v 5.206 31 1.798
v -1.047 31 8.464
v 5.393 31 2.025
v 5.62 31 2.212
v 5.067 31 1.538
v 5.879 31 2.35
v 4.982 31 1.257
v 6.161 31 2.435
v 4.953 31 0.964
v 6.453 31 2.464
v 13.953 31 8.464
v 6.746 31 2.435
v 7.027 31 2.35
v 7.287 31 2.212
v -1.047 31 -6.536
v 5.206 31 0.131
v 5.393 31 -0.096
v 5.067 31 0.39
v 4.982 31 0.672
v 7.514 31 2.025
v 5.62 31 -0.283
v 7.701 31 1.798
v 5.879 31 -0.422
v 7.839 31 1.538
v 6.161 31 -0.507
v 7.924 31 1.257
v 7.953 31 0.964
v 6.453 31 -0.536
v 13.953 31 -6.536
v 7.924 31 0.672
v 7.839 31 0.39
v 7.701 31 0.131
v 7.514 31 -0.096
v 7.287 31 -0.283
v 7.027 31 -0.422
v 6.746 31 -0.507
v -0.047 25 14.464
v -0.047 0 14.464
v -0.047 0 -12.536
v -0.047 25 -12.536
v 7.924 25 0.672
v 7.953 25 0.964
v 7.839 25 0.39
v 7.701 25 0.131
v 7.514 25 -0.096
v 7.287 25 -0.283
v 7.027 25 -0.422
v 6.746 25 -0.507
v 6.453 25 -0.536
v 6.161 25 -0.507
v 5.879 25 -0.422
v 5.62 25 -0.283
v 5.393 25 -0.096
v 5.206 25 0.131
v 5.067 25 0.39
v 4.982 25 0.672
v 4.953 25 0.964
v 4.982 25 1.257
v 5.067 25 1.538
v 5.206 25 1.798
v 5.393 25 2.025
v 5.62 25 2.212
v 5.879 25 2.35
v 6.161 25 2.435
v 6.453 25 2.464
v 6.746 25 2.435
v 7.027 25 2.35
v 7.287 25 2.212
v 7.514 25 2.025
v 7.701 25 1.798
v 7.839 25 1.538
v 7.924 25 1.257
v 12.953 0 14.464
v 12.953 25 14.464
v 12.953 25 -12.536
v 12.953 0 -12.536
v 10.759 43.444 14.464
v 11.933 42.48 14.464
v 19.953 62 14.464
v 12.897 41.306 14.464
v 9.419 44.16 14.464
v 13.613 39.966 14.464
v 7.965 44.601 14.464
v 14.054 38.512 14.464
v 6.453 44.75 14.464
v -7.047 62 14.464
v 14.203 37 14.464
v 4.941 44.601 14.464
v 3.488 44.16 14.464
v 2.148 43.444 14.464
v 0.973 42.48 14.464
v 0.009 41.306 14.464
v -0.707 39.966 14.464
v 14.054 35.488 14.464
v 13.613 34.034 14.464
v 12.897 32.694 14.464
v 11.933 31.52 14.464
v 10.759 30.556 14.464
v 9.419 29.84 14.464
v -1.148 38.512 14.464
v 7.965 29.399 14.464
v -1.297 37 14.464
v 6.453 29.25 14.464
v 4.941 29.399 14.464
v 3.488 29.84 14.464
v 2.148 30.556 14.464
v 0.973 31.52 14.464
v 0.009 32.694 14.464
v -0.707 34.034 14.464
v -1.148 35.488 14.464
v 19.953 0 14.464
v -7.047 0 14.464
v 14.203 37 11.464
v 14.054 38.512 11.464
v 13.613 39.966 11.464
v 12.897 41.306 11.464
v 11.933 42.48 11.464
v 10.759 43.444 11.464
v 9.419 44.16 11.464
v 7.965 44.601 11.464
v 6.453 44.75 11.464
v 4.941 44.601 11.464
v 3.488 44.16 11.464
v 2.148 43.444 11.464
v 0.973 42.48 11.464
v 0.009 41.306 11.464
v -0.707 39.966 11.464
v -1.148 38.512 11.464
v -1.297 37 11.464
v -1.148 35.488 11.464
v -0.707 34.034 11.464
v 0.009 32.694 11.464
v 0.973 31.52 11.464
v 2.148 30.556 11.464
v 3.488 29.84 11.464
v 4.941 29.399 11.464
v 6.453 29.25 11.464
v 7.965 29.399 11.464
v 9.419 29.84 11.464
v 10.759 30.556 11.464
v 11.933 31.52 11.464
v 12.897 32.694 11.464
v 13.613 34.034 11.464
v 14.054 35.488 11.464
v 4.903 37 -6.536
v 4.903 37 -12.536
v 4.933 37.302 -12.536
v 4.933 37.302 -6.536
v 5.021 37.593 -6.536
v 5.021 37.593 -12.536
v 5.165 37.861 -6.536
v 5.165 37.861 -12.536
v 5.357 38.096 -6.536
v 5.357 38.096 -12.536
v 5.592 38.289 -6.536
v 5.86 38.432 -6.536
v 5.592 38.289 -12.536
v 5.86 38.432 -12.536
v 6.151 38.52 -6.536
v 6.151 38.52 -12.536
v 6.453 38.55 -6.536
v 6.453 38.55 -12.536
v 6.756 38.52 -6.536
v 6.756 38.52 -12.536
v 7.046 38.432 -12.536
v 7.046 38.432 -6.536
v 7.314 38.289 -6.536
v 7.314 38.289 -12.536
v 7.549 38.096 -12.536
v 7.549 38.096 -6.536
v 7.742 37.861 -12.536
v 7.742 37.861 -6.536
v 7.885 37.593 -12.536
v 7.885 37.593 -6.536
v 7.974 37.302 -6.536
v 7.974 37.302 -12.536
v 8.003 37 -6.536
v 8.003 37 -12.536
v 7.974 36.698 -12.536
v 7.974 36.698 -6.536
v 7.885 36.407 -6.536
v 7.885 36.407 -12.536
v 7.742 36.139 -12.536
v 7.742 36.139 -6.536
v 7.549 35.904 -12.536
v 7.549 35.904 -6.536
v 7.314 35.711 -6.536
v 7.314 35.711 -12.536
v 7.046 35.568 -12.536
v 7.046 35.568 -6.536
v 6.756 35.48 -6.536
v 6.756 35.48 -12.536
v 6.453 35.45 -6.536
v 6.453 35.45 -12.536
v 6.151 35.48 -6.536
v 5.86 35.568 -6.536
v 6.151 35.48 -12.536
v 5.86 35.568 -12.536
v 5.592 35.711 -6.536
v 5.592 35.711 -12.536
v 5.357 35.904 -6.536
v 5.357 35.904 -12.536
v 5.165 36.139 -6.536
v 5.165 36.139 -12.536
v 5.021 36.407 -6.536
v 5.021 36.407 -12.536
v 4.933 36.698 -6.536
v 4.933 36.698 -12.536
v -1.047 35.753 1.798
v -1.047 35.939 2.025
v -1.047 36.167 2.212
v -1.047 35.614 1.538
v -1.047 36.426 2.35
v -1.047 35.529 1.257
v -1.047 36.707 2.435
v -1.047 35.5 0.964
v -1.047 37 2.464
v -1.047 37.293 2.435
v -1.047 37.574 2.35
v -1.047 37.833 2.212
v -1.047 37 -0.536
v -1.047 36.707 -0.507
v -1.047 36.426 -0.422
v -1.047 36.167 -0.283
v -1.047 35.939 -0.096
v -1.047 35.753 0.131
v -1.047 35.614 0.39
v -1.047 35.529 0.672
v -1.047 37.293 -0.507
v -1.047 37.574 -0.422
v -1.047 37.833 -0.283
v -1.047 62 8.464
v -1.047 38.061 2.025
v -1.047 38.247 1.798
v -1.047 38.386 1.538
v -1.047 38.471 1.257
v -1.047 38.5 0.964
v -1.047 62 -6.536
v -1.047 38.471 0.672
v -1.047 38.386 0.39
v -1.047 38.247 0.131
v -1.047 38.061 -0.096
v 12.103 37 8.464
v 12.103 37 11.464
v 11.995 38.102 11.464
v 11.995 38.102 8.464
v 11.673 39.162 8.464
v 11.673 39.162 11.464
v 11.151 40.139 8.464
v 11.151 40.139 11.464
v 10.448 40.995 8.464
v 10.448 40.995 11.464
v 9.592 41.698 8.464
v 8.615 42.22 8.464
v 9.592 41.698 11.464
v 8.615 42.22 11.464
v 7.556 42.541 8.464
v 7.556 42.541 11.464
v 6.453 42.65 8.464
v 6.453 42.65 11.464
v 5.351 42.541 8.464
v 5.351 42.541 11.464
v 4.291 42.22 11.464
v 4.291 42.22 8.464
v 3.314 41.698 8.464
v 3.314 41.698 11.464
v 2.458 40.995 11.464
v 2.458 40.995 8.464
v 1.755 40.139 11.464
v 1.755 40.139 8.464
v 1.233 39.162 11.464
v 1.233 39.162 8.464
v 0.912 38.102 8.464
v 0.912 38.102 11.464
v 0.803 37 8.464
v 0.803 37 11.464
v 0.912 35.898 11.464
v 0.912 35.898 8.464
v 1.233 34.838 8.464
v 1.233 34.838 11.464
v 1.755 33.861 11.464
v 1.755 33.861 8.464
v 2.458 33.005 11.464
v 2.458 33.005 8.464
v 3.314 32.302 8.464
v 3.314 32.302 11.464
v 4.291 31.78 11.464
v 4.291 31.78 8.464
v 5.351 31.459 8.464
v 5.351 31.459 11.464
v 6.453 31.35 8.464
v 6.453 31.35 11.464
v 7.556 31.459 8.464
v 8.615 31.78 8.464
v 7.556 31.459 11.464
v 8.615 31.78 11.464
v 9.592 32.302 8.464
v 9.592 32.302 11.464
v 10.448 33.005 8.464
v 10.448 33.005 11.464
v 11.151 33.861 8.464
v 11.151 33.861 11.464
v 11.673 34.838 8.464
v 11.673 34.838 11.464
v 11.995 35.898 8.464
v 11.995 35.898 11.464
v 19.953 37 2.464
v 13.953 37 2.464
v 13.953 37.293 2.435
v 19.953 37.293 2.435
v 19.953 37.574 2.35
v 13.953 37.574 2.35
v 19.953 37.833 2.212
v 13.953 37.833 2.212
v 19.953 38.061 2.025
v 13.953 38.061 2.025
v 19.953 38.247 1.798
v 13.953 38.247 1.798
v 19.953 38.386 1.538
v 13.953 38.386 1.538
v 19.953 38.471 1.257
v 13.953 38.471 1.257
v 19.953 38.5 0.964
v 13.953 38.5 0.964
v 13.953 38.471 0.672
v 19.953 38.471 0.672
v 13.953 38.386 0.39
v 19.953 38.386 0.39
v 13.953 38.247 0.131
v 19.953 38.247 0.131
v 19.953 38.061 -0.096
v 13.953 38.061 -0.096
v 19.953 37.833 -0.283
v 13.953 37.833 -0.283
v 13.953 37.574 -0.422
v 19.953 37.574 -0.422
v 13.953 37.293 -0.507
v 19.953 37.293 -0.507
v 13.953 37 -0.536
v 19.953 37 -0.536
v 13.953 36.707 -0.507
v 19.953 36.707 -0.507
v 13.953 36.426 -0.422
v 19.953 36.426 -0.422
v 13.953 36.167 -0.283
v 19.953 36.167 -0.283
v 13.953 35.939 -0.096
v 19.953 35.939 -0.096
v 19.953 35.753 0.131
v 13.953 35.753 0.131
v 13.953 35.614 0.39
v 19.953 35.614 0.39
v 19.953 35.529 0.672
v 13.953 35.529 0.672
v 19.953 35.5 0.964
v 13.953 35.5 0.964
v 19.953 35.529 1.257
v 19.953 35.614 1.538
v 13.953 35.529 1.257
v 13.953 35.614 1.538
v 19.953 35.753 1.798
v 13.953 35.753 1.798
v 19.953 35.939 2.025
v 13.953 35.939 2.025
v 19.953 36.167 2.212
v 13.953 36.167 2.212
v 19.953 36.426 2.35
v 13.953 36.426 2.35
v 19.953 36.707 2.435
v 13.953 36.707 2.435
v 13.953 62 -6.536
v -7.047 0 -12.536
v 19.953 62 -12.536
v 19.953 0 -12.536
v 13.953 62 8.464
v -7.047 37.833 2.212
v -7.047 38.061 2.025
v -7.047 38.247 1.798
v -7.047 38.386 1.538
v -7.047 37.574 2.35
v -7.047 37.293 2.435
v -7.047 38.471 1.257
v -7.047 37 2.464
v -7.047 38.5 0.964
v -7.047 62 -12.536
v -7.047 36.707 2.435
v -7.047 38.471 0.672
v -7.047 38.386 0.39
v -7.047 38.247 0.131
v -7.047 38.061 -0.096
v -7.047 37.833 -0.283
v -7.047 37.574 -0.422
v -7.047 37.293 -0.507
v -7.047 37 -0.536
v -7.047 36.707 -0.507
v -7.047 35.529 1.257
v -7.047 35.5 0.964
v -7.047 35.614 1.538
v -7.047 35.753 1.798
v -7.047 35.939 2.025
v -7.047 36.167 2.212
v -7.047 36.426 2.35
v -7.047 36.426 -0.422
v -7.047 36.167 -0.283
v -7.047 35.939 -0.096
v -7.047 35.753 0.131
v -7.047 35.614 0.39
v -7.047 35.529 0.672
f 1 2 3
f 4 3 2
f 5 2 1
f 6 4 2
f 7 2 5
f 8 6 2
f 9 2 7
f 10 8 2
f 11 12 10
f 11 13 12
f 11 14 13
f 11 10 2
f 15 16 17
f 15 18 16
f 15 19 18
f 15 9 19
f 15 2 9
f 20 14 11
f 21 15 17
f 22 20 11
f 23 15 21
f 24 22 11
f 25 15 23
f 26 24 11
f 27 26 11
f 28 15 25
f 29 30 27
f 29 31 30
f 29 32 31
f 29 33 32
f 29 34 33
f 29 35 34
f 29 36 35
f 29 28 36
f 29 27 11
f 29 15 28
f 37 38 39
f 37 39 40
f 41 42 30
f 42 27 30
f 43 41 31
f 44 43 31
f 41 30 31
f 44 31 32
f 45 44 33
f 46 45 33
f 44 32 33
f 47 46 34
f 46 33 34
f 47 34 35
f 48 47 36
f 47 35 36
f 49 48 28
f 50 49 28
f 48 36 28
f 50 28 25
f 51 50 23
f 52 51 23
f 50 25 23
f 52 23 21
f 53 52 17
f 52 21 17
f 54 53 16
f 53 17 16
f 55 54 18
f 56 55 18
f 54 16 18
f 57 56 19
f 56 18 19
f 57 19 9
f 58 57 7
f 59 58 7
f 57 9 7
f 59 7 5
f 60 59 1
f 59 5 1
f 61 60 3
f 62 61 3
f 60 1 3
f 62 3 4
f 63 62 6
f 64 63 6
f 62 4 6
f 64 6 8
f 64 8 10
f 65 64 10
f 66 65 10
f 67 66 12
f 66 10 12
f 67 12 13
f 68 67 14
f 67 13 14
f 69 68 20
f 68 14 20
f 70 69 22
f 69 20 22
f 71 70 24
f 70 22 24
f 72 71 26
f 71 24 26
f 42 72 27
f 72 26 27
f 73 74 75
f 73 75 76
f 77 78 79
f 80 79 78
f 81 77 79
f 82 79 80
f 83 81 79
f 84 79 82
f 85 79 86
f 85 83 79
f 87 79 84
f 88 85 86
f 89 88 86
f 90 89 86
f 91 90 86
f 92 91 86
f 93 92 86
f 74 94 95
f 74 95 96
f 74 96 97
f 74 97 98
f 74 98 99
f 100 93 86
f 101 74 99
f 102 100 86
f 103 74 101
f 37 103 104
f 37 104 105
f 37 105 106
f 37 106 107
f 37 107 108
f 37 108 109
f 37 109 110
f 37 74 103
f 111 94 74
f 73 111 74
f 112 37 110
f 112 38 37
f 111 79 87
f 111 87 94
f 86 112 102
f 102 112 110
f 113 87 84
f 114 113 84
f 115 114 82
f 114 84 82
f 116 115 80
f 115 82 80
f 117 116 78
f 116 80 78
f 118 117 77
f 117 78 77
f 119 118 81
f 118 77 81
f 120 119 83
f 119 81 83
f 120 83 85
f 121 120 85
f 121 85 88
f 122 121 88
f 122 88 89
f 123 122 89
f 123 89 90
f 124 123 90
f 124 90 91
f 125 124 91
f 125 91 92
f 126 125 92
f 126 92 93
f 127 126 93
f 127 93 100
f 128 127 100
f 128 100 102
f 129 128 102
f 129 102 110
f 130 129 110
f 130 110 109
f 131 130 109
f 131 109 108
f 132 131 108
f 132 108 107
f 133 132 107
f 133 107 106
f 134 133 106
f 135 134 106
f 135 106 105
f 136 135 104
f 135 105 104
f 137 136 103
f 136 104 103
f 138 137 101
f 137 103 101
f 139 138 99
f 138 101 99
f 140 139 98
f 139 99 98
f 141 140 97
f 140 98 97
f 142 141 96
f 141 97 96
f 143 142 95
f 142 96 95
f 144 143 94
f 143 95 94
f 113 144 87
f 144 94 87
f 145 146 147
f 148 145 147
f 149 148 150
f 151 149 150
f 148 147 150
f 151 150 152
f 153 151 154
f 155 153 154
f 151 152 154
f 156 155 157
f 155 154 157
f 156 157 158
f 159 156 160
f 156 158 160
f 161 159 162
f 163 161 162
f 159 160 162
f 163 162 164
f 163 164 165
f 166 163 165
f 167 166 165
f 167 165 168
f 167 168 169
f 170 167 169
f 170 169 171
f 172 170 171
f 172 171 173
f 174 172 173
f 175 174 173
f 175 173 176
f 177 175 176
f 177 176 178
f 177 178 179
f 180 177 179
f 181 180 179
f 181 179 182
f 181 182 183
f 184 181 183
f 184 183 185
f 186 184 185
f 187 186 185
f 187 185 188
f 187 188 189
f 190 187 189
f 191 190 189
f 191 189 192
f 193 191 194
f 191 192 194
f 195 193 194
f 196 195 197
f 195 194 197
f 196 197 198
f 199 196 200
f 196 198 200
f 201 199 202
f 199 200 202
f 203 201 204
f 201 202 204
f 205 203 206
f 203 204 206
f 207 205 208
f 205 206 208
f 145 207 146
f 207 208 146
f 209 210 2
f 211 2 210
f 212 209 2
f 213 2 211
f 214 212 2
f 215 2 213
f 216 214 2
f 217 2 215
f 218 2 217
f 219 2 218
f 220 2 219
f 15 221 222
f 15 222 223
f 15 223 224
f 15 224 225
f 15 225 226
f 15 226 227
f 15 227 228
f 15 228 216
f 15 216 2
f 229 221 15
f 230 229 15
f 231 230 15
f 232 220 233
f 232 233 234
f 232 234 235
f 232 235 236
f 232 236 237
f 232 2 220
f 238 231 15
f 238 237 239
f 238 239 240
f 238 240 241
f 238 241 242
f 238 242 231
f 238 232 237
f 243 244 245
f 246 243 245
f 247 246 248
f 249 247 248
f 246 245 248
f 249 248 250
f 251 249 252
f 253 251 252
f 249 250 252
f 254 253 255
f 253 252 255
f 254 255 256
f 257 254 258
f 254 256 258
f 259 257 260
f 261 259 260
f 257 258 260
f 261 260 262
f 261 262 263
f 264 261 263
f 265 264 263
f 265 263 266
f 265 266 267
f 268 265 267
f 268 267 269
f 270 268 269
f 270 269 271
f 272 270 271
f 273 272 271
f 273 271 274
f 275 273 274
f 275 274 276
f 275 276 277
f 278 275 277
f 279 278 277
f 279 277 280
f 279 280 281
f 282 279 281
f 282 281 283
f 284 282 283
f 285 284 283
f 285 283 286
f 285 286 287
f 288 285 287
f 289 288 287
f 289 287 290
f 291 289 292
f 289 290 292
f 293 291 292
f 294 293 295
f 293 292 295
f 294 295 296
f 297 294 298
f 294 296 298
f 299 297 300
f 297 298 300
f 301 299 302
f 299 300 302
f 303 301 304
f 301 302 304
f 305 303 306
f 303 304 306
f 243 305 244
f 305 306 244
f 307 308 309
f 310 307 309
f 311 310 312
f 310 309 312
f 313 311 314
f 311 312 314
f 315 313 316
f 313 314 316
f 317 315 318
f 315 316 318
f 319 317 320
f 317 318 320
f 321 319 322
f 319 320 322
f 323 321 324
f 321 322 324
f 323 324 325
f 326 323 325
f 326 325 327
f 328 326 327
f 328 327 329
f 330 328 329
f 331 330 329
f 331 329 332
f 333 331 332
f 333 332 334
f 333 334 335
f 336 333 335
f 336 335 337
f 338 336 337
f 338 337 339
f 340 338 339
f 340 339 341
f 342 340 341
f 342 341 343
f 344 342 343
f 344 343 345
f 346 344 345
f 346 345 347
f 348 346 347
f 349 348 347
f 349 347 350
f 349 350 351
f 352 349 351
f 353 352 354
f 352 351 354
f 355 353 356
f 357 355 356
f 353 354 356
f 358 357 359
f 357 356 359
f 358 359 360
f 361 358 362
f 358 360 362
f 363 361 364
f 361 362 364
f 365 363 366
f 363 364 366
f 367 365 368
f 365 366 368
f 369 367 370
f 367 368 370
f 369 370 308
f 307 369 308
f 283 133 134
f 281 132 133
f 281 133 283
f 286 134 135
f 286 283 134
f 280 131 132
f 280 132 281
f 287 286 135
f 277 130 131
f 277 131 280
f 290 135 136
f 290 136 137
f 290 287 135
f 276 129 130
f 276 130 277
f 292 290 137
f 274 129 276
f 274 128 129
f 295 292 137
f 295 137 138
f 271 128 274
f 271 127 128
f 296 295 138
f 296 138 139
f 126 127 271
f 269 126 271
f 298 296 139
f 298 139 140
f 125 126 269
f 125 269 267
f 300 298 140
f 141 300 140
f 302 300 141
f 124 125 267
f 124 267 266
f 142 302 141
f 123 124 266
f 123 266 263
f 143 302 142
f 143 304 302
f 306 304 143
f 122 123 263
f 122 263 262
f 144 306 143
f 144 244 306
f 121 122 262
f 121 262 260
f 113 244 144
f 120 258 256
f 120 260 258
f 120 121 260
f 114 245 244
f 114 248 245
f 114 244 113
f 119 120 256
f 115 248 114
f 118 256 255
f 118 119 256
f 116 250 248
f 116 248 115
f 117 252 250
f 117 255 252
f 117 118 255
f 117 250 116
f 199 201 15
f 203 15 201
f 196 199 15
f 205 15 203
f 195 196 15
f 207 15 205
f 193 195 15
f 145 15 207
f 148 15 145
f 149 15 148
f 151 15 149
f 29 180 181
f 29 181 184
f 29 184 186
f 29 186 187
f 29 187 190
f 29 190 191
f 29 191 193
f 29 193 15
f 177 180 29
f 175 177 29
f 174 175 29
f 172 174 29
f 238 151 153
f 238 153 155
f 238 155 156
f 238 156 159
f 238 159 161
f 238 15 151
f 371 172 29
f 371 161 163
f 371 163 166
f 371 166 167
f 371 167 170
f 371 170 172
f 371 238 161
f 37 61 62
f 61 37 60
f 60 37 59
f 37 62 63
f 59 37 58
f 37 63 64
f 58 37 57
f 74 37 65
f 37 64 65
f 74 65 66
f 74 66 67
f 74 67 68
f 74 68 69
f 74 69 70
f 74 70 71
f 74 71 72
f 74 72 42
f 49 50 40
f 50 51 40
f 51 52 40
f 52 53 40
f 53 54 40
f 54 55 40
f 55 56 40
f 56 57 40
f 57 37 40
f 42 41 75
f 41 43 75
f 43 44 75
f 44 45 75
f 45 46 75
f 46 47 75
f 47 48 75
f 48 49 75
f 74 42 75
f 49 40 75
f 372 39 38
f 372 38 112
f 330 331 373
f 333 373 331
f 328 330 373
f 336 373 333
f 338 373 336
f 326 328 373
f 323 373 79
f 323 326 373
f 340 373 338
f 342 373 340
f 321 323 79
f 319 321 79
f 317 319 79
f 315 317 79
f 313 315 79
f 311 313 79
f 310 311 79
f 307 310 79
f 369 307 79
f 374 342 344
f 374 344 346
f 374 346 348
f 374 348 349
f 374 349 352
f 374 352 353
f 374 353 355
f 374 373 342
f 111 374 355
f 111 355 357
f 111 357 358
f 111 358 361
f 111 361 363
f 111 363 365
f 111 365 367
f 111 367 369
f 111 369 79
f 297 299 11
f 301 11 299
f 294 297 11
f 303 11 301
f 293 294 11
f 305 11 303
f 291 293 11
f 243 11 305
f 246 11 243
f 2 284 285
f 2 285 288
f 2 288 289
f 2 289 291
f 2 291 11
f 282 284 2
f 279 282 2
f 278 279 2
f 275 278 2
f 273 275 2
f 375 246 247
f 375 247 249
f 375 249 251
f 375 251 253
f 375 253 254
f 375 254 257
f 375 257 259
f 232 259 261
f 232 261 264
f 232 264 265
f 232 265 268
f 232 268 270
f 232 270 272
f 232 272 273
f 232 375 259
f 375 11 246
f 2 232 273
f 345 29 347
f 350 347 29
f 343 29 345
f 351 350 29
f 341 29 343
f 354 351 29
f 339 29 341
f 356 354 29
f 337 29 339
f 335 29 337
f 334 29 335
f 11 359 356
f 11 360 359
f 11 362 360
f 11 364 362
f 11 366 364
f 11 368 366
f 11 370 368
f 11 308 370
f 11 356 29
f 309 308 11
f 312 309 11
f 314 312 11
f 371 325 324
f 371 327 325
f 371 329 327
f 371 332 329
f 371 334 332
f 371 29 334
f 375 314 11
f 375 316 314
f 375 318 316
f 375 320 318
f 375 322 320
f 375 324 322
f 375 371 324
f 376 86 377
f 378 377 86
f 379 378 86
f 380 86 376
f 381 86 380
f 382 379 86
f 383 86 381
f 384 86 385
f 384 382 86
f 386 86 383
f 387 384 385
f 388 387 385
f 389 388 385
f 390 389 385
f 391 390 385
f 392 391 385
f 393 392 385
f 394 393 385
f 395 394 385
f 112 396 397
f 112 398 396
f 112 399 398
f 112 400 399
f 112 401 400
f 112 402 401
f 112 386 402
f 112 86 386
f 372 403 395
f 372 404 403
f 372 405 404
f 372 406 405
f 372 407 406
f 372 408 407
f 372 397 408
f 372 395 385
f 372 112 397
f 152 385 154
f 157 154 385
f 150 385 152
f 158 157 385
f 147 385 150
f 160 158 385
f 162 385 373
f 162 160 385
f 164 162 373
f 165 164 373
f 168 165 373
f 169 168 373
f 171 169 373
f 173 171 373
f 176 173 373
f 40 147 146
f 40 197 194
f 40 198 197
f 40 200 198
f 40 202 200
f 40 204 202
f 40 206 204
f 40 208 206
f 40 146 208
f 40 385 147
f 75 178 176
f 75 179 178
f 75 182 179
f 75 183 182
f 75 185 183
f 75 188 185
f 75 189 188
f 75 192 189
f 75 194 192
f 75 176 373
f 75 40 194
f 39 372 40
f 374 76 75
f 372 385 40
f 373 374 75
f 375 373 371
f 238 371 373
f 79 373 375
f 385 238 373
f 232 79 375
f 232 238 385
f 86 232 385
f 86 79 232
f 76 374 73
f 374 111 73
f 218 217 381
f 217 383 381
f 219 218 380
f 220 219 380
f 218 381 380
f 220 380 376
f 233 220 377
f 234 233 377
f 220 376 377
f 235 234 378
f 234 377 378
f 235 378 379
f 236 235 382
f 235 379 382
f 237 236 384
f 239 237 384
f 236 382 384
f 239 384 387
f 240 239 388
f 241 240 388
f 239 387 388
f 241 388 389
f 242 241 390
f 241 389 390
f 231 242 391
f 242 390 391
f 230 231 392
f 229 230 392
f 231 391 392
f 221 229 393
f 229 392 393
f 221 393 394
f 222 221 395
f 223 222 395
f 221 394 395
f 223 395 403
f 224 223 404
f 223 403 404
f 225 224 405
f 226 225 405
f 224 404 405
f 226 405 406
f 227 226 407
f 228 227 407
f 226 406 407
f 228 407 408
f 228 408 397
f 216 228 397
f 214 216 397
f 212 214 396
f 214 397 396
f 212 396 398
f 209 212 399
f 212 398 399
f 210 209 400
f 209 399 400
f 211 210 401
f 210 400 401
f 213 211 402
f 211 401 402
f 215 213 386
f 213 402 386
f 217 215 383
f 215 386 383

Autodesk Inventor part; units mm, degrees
ref_plane "YZ Plane" through (0, 0, 0) normal (1, 0, 0) x (0, 1, 0)
ref_plane "XZ Plane" through (0, 0, 0) normal (0, 1, 0) x (-1, 0, 0)
ref_plane "XY Plane" through (0, 0, 0) normal (0, 0, 1) x (1, 0, 0)
sketch "Boceto1" plane through (0, 0, 0) normal (0, 1, 0) x (-1, 0, 0)
  line L0 (-19.9533, 14.4643) -> (7.0467, 14.4643)
  line L1 (7.0467, 14.4643) -> (7.0467, -12.5357)
  line L2 (7.0467, -12.5357) -> (-19.9533, -12.5357)
  line L3 (-19.9533, -12.5357) -> (-19.9533, 14.4643)
  point P0 (0, 0)
  dimension "d0" = 27
  dimension "d1" = 27
extrude "Extrusión1" add sketch "Boceto1" along normal blind 62
sketch "Boceto2" plane through (0, 62, 0) normal (0, 1, 0) x (1, 0, 0)
  line L0 (-7.0467, -14.4643) -> (19.9533, -14.4643) projected
  line L1 (19.9533, -14.4643) -> (19.9533, 12.5357) projected
  line L2 (19.9533, 12.5357) -> (-7.0467, 12.5357) projected
  line L3 (-7.0467, 12.5357) -> (-7.0467, -14.4643) projected
  line L4 (-1.0467, 6.5357) -> (13.9533, 6.5357)
  line L5 (13.9533, 6.5357) -> (13.9533, -8.4643)
  line L6 (13.9533, -8.4643) -> (-1.0467, -8.4643)
  line L7 (-1.0467, -8.4643) -> (-1.0467, 6.5357)
  point P0 (0, 0)
  dimension "d4" = 6
  dimension "d5" = 6
  dimension "d6" = 6
  dimension "d7" = 6
extrude "Extrusión2" cut sketch "Boceto2" against normal blind 31 contours L4 L5 L6 L7
sketch "Boceto3" plane through (19.9533, 0, -12.5357) normal (0, 0, -1) x (-1, 0, 0)
  line L0 (27, 0) -> (0, 0) projected
  line L1 (27, 0) -> (27, 62) projected
  line L2 (0, 0) -> (0, 62) projected
  line L3 (20, 25) -> (7, 25)
  line L4 (7, 25) -> (7, 0)
  line L5 (7, 0) -> (20, 0)
  line L6 (20, 0) -> (20, 25)
  line L7 (0, 62) -> (27, 62) projected
  circle A0 centre (13.5, 39) radius 2.55
  point P0 (19.9533, 0)
  dimension "d10" = 7
  dimension "d11" = 7
  dimension "d12" = 25
  dimension "d16" = 5.1
  dimension "d17" = 13.5
  dimension "d18" = 23
extrude "Extrusión3" cut sketch "Boceto3" against normal blind 30 contours L0 L4 L3 L6
sketch "Boceto4" plane through (19.9533, 62, -12.5357) normal (0, 0, -1) x (-1, 0, 0)
  line L0 (0, -62) -> (0, 0) projected
  circle A0 centre (13.5, -25) radius 1.55
  line L1 (21, -31) -> (6, -31) projected
  point P0 (19.9533, -62)
  dimension "d19" = 3.1
  dimension "d20" = 13.5
  dimension "d34" = 6
extrude "Extrusión4" cut sketch "Boceto4" against normal blind 7
sketch "Boceto5" plane through (-7.0467, 62, 14.4643) normal (0, 0, 1) x (1, 0, 0)
  line L0 (27, -62) -> (27, 0) projected
  circle A0 centre (13.5, -25) radius 7.75
  line L1 (21, -31) -> (6, -31) projected
  point P0 (7.0467, -62)
  dimension "d24" = 15.5
  dimension "d25" = 13.5
  dimension "d33" = 6
extrude "Extrusión5" cut sketch "Boceto5" against normal blind 3
sketch "Boceto6" plane through (6.4533, 37, 11.4643) normal (0, 0, 1) x (1, 0, 0)
  circle A0 centre (0, 0) radius 7.75 projected
  circle A1 centre (0, 0) radius 5.65
  point P0 (-6.4533, -37)
  dimension "d29" = 11.3
extrude "Extrusión6" cut sketch "Boceto6" against normal blind 3 contours A1
sketch "Boceto8" plane through (-7.0467, 0, -12.5357) normal (-1, 0, 0) x (0, 0, 1)
  line L0 (27, 0) -> (27, 62) projected
  circle A0 centre (13.5, 37) radius 1.5
  line L1 (0, 25) -> (27, 25) projected
  line L2 (0, 25) -> (27, 25) projected
  point P0 (12.5357, 0)
  dimension "d42" = 13.5
  dimension "d43" = 3
  dimension "d47" = 12
extrude "Extrusión8" cut sketch "Boceto8" against normal through all
sketch "Boceto10" plane through (0, 31, 0) normal (0, 1, 0) x (1, 0, 0)
  line L0 (-1.0467, 6.5357) -> (13.9533, 6.5357) projected
  line L1 (13.9533, 6.5357) -> (13.9533, -8.4643) projected
  circle A0 centre (6.4533, -0.9643) radius 1.5
  point P0 (0, 0)
  dimension "d62" = 3
  dimension "d63" = 7.5
  dimension "d64" = 7.5
extrude "Extrusión10" cut sketch "Boceto10" against normal through all
properties part number "Cubeta Final sin huecos"
